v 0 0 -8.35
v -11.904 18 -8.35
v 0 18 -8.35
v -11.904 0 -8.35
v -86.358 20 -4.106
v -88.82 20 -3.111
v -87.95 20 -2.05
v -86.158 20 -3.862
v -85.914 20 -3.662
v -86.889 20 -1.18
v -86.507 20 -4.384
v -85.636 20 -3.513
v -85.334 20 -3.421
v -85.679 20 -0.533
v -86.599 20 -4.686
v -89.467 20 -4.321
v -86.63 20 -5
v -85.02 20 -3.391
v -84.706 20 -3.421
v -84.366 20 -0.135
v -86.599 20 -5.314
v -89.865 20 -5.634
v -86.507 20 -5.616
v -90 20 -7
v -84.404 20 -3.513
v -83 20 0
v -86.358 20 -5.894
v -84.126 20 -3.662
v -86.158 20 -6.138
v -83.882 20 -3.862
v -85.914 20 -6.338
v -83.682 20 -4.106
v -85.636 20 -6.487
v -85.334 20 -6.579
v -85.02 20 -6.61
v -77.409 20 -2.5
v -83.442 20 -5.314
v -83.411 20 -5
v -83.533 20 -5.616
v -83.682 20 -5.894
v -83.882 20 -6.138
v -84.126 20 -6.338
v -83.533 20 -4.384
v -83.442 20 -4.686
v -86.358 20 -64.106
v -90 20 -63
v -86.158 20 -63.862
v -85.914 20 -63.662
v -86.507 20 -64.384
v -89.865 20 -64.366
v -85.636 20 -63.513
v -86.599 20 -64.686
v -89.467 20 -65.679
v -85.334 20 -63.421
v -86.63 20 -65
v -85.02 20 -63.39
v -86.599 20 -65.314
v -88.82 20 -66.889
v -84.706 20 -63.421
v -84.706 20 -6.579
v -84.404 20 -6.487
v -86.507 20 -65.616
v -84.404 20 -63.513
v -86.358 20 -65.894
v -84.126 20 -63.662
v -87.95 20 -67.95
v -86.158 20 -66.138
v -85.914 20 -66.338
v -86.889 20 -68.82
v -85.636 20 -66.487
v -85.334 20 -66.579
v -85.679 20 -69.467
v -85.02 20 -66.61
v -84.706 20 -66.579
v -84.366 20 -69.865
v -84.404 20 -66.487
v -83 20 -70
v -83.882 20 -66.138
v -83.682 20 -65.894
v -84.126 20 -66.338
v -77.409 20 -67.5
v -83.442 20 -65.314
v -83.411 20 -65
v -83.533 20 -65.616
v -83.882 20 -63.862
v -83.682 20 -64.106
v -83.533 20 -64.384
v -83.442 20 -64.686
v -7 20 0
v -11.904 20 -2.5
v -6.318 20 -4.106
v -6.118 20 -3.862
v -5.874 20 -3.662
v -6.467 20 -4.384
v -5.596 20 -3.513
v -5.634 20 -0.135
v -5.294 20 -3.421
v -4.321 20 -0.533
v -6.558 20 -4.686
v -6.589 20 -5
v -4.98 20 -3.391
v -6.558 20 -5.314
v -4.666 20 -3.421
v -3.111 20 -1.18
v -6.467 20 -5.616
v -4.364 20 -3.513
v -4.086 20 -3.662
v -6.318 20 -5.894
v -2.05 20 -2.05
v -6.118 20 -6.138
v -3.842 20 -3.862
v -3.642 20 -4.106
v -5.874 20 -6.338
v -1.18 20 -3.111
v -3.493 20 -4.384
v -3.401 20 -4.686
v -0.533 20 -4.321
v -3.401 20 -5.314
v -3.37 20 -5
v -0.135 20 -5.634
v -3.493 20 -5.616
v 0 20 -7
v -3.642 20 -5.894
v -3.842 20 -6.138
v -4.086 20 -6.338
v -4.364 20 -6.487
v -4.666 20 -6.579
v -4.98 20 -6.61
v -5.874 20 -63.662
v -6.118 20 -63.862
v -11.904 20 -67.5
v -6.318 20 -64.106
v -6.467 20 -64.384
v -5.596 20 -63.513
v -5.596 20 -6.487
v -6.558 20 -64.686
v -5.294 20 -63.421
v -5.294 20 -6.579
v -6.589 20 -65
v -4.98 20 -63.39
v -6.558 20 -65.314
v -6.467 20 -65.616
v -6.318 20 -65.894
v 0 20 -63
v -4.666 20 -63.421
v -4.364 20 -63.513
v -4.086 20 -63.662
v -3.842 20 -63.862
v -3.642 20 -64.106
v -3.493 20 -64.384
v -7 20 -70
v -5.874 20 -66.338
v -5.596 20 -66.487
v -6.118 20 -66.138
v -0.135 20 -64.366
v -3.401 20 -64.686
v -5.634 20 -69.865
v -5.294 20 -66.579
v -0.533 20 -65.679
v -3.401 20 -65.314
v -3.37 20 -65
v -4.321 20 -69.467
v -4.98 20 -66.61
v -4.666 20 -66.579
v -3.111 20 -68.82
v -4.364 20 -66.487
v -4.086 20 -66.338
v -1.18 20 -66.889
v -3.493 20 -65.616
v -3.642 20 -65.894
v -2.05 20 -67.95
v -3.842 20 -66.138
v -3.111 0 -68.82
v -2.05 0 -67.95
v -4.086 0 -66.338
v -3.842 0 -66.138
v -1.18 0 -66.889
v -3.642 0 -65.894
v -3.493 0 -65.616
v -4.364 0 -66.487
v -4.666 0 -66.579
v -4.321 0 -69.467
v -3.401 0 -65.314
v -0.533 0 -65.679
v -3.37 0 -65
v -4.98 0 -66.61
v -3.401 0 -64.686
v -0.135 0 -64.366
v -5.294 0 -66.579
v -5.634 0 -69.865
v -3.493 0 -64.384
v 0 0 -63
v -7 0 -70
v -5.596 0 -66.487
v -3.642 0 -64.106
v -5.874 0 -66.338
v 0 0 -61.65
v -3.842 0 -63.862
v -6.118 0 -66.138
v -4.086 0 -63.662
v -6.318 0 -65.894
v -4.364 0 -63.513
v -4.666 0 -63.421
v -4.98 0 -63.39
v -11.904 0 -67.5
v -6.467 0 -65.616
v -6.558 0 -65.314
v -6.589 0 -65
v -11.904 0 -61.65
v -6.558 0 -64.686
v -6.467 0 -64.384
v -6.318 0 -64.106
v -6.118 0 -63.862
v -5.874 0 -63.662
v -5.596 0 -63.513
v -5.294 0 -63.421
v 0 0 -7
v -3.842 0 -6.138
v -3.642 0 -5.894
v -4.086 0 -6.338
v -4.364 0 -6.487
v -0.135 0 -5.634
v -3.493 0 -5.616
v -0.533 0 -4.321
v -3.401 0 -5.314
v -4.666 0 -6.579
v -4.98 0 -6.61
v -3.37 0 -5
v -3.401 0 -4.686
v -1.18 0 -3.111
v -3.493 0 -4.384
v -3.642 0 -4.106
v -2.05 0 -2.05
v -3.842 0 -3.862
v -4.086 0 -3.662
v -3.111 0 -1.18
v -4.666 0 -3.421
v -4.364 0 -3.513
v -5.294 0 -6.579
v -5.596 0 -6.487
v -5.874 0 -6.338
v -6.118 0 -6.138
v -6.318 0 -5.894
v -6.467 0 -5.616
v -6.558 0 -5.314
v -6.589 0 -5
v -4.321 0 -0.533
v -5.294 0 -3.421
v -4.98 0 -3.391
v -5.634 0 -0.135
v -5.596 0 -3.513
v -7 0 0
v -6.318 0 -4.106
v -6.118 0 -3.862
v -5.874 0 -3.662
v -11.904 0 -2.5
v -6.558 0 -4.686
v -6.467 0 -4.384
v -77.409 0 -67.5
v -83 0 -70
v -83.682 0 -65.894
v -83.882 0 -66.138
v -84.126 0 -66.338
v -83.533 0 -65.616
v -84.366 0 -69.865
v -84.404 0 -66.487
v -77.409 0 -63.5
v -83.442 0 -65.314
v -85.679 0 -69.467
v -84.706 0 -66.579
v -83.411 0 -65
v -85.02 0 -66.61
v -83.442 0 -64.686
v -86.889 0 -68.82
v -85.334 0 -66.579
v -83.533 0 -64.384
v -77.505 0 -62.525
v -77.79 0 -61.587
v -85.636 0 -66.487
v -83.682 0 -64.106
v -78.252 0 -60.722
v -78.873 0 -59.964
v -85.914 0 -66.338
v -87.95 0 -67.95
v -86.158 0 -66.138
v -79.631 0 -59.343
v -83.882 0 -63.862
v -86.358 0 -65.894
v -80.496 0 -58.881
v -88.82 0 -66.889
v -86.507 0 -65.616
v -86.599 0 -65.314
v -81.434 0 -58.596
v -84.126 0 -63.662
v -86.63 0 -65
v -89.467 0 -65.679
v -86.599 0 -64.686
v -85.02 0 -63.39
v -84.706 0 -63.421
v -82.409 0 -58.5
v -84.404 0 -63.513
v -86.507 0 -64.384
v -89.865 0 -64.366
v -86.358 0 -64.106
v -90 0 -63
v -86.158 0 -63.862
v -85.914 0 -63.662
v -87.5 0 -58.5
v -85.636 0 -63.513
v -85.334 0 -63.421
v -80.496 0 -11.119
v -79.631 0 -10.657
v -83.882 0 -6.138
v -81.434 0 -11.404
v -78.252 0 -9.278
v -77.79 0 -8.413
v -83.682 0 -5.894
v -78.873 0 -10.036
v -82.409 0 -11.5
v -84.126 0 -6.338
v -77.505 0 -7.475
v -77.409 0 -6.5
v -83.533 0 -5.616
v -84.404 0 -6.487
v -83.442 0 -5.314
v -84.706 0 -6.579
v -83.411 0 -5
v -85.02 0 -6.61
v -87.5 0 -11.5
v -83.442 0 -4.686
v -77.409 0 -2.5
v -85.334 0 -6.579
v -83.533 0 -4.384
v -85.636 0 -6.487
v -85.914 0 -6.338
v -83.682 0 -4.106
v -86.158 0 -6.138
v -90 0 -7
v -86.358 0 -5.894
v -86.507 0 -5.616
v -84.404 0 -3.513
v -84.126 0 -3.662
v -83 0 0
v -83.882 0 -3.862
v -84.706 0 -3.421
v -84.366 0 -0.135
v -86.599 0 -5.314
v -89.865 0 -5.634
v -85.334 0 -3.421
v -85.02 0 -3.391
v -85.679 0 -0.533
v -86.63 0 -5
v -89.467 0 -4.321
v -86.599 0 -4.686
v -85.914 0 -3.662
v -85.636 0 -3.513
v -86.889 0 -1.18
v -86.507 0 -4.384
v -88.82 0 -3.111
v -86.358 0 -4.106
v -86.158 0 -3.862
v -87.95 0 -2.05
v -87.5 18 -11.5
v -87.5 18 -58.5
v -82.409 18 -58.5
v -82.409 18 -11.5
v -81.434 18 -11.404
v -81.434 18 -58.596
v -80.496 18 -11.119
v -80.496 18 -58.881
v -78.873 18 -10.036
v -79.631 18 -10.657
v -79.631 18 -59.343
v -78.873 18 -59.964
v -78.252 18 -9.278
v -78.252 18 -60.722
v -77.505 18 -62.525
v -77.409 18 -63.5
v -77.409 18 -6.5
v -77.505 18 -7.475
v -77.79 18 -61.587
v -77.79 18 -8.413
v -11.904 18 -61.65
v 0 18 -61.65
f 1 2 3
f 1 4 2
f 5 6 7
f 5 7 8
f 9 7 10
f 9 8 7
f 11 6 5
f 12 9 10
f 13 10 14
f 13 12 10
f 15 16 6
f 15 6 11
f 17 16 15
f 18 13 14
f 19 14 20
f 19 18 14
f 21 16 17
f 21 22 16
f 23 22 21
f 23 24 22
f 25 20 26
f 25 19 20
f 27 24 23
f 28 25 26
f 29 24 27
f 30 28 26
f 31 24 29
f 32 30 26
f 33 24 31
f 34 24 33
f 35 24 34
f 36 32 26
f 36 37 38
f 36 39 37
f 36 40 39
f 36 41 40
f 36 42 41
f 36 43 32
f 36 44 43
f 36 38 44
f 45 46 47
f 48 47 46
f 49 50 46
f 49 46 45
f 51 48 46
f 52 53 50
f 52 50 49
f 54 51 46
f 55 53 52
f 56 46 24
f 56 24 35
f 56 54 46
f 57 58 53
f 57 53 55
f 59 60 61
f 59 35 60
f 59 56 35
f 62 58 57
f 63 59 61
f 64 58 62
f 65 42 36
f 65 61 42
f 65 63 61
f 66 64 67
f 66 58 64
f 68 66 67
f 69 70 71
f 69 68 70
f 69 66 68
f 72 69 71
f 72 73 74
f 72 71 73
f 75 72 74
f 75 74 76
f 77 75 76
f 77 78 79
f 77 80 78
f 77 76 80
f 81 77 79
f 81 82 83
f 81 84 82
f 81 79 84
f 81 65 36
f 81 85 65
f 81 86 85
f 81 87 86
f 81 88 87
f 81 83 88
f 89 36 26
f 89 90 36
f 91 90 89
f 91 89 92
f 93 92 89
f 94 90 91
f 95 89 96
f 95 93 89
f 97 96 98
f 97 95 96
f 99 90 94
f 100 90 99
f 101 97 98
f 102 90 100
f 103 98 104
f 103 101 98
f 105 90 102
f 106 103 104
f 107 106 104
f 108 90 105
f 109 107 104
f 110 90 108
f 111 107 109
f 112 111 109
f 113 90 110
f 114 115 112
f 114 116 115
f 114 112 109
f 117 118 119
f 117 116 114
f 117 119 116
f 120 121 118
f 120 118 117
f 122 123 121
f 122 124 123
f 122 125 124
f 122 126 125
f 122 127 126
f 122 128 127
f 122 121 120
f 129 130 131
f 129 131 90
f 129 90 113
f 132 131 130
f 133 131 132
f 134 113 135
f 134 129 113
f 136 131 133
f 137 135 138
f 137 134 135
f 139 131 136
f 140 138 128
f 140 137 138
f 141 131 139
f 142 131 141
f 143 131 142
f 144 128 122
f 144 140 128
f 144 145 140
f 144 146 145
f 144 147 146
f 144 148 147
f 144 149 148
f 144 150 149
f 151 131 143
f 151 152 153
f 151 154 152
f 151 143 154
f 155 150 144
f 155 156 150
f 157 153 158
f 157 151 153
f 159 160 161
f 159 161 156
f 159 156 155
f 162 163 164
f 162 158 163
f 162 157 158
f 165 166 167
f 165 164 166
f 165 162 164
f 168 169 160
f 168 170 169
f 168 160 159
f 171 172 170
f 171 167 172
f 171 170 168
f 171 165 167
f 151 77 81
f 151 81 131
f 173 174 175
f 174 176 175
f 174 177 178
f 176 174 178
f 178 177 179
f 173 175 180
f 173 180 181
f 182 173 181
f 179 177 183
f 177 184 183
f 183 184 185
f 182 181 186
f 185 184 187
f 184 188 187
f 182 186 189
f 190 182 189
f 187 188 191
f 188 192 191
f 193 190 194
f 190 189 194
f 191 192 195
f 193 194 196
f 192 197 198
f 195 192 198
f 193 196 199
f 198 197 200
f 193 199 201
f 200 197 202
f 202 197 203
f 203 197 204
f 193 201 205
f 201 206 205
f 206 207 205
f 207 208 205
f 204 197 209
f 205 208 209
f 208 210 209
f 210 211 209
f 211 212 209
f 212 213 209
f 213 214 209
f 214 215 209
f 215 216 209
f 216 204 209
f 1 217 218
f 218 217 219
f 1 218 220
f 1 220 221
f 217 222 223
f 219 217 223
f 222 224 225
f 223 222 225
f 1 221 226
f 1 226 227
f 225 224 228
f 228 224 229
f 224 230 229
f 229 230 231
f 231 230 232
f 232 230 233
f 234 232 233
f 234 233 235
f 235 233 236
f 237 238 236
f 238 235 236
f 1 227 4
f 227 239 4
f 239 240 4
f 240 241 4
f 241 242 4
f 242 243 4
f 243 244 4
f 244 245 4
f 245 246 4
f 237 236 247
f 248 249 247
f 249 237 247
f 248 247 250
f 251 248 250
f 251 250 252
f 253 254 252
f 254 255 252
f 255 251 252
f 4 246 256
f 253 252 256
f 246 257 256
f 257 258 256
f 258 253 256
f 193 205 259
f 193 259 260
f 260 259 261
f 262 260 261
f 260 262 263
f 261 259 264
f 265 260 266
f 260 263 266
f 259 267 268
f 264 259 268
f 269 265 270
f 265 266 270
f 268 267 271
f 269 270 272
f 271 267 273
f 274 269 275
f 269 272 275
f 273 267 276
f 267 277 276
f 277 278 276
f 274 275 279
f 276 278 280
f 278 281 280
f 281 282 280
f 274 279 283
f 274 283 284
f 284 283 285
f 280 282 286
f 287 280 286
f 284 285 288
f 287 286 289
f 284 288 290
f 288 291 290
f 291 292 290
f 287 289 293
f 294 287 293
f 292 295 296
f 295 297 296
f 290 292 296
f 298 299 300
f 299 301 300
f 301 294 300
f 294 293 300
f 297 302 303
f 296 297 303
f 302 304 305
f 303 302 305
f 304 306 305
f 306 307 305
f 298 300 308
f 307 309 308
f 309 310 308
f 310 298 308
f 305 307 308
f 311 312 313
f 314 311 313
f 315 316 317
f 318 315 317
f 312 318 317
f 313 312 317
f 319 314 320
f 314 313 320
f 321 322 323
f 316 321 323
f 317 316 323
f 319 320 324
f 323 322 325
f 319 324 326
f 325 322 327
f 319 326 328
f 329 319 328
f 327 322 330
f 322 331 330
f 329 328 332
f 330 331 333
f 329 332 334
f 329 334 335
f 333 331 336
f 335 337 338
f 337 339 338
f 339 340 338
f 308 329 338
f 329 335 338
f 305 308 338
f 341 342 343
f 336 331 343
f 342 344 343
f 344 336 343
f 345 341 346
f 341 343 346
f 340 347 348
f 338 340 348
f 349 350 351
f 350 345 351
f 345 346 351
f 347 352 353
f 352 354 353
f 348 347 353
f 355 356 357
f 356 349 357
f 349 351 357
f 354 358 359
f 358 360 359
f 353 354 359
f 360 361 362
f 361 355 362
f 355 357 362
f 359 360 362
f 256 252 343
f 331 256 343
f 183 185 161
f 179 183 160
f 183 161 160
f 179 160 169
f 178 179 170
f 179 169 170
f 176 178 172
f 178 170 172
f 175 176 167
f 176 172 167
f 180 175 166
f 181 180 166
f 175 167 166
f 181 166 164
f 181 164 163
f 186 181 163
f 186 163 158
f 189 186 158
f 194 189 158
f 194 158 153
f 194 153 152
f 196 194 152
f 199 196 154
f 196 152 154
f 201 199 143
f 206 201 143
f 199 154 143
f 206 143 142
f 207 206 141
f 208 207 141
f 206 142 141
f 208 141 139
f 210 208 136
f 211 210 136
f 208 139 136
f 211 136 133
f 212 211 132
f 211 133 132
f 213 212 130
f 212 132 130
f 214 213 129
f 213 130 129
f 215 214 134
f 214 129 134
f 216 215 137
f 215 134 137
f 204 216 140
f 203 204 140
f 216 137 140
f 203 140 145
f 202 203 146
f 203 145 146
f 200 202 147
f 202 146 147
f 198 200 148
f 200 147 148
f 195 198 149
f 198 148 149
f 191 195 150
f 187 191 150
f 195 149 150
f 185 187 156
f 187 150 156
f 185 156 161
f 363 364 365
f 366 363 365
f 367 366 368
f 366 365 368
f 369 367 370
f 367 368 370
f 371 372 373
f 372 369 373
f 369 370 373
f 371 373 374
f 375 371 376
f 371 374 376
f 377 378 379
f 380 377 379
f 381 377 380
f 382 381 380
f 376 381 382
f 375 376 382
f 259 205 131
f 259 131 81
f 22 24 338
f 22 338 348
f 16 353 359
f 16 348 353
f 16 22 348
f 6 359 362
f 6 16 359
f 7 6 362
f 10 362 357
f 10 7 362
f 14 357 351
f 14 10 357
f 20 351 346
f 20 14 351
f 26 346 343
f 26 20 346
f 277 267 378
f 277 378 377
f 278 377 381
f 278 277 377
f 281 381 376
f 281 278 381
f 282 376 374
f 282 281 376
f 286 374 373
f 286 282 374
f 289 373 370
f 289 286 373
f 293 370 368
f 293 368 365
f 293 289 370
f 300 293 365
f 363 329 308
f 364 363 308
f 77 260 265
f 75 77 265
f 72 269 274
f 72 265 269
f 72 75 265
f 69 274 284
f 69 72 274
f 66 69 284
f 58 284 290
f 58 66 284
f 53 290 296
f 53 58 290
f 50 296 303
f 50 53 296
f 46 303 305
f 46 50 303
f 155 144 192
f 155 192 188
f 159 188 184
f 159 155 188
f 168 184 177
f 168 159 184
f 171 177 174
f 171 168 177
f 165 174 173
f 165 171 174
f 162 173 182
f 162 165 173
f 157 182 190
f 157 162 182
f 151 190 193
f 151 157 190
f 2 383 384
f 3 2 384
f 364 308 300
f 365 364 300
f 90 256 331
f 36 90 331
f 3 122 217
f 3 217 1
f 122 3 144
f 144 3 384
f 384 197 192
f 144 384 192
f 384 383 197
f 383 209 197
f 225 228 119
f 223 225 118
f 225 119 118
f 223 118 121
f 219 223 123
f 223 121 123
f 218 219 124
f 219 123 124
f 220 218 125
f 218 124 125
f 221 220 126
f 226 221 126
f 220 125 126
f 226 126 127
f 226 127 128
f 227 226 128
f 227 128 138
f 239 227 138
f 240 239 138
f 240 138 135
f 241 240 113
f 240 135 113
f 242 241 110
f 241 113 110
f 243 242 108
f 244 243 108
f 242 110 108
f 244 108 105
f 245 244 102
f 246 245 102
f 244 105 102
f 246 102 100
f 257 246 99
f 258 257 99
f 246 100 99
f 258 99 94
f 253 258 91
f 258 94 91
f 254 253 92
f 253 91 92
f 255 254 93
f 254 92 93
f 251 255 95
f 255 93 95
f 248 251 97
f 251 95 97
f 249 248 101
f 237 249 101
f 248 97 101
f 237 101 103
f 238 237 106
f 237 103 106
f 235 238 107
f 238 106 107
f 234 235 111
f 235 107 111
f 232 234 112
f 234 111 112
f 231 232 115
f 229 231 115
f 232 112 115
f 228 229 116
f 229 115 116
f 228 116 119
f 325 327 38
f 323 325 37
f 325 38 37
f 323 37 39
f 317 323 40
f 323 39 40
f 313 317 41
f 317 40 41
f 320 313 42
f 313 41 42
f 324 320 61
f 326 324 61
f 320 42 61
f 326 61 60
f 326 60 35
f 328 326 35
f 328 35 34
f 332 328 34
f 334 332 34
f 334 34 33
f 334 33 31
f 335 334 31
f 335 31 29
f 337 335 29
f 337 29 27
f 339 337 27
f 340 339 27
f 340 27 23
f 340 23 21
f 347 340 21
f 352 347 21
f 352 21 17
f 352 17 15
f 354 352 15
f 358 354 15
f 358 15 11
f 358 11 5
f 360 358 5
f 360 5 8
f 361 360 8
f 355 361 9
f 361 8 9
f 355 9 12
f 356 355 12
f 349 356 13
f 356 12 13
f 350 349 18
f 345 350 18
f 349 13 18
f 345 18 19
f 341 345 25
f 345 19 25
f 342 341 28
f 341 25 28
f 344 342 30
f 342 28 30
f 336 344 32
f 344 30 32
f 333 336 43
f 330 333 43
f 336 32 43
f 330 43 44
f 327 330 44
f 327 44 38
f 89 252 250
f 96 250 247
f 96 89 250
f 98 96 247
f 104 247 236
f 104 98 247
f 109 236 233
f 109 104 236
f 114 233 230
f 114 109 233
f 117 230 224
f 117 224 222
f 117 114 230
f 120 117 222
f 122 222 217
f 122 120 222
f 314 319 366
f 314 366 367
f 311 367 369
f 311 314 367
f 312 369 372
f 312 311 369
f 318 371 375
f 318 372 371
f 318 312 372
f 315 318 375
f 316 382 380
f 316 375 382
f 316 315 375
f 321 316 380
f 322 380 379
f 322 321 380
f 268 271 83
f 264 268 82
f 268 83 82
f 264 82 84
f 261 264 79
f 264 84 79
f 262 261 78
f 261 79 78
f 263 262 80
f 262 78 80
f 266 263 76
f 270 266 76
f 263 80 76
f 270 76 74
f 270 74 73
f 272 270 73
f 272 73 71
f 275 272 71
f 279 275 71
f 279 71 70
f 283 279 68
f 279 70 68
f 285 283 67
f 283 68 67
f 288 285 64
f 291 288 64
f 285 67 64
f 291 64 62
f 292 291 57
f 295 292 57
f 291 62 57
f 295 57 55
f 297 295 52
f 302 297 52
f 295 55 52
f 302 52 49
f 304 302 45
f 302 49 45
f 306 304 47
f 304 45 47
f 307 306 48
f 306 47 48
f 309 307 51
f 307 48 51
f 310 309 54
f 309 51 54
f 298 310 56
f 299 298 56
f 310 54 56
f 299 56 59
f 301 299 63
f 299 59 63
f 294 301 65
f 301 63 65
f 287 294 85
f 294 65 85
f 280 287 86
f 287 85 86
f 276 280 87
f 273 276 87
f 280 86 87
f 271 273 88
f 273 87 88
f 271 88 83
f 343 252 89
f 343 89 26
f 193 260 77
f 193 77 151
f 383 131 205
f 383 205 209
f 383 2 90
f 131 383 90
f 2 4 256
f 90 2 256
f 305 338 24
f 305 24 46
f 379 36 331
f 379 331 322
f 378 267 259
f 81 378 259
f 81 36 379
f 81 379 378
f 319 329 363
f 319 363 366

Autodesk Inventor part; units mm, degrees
ref_plane "YZ Plane" through (0, 0, 0) normal (1, 0, 0) x (0, 1, 0)
ref_plane "XZ Plane" through (0, 0, 0) normal (0, 1, 0) x (-1, 0, 0)
ref_plane "XY Plane" through (0, 0, 0) normal (0, 0, 1) x (1, 0, 0)
sketch "Sketch1" plane through (0, 0, 0) normal (0, 1, 0) x (-1, 0, 0)
  line L0 (0, 0) -> (90, 0)
  line L1 (90, 0) -> (90, -70)
  line L2 (90, -70) -> (0, -70)
  circle A0 centre (85, -65) radius 1.6095
  circle A1 centre (85, -5) radius 1.6095
  circle A2 centre (5, -65) radius 1.6095
  circle A3 centre (5, -5) radius 1.6095
  line L3 (11.9037, -61.65) -> (11.9037, -67.5)
  line L4 (11.9037, -67.5) -> (77.409, -67.5)
  line L5 (77.409, -67.5) -> (77.409, -58.5)
  line L6 (87.5, -35) -> (87.5, -58.5)
  line L7 (87.5, -58.5) -> (77.409, -58.5)
  line L8 (11.9037, -61.65) -> (0, -61.65)
  line L9 (0, -61.65) -> (0, -70)
  line L10 (11.9037, -8.35) -> (11.9037, -2.5)
  line L11 (11.9037, -2.5) -> (77.409, -2.5)
  line L12 (77.409, -2.5) -> (77.409, -11.5)
  line L13 (87.5, -35) -> (87.5, -11.5)
  line L14 (87.5, -11.5) -> (77.409, -11.5)
  line L15 (11.9037, -8.35) -> (0, -8.35)
  line L16 (0, -8.35) -> (0, 0)
  line L17 (99.038, -35) -> (-9.0118, -35) construction
  point P0 (11.9037, -5.425)
  dimension "d34" = 70
  dimension "d35" = 60
  dimension "d37" = 10.091
  dimension "d38" = 65.5053
  dimension "d39" = 60
  dimension "d40" = 70
  dimension "d41" = 9
  dimension "d43" = 90
  dimension "d44" = 11.9037
  dimension "d45" = 3.219
  dimension "d46" = 47
  dimension "d47" = 5.85
  dimension "d48" = 8.35
  dimension "d49" = 5
  dimension "d50" = 5
  dimension "d51" = 5
  dimension "d52" = 5
extrude "Extrusion1" add sketch "Sketch1" along normal blind 20 contours L0 L1 L2 L9 L8 L3 L4 L5 L7 L6 L13 L14 L12 L11 L10 L15 L16 | A0 | A1 | A2 | A3
sketch "Sketch2" plane through (0, 20, 0) normal (0, 1, 0) x (1, 0, 0)
  line L0 (0, 70) -> (-90, 70) projected
  circle A0 centre (-4.9798, 65) radius 1.6095
  line L1 (-90, 70) -> (-90, 0) projected
  circle A1 centre (-85.0202, 65) radius 1.6095
  circle A2 centre (-4.9798, 5) radius 1.6095
  circle A3 centre (-85.0202, 5) radius 1.6095
  point P0 (0, 0)
extrude "Extrusion2" cut sketch "Sketch2" against normal blind 30
fillet "Fillet1" radius 7 4 edges at (-90, 10, 0) (-90, 10, -70) (0, 10, -70) (0, 10, 0)
sketch "Sketch4" plane through (0, 20, 0) normal (0, 1, 0) x (1, 0, 0)
  line L0 (-77.409, 11.5) -> (-77.409, 58.5)
  line L1 (-77.409, 58.5) -> (-87.5, 58.5)
  line L2 (-87.5, 58.5) -> (-87.5, 11.5)
  line L3 (-87.5, 11.5) -> (-77.409, 11.5)
  point P0 (0, 0)
extrude "Extrusion3" add sketch "Sketch4" against normal blind 2
sketch "Sketch5" plane through (0, 20, 0) normal (0, 1, 0) x (1, 0, 0)
  line L0 (-11.9037, 61.65) -> (-11.9037, 8.35)
  line L1 (-11.9037, 8.35) -> (0, 8.35)
  line L2 (0, 8.35) -> (0, 61.65)
  line L3 (0, 61.65) -> (-11.9037, 61.65)
  line L4 (-11.9037, 61.65) -> (-77.409, 61.65)
  line L5 (-77.409, 58.5) -> (-77.409, 67.5) projected
  line L6 (-77.409, 67.5) -> (-77.409, 61.65)
  line L7 (-11.9037, 61.65) -> (-11.9037, 67.5)
  line L8 (-11.9037, 67.5) -> (-77.409, 67.5)
  line L9 (-11.9037, 2.5) -> (-77.409, 2.5) projected
  line L10 (-11.9037, 8.35) -> (-11.9037, 2.5)
  line L11 (-11.9037, 2.5) -> (-77.409, 2.5)
  line L12 (-77.409, 2.5) -> (-77.409, 8.35)
  line L13 (-77.409, 8.35) -> (-11.9037, 8.35)
  point P0 (0, 0)
extrude "Extrusion4" add sketch "Sketch5" against normal blind 2
fillet "Fillet2" radius 5 1 edges at (-77.409, 9, -58.5)
fillet "Fillet3" radius 5 1 edges at (-77.409, 9, -11.5)
fillet "Fillet4" radius 5 4 edges at (-77.409, 19, -61.65) (-11.9037, 19, -61.65) (-11.9037, 19, -8.35) (-77.409, 19, -8.35)
sketch "Sketch6" plane through (0, 20, 0) normal (0, 1, 0) x (1, 0, 0)
  line L0 (-77.409, 67.5) -> (-11.9037, 67.5)
  line L1 (-11.9037, 67.5) -> (-11.9037, 2.5)
  line L2 (-11.9037, 2.5) -> (-77.409, 2.5)
  line L3 (-77.409, 2.5) -> (-77.409, 67.5)
  point P0 (0, 0)
extrude "Extrusion5" cut sketch "Sketch6" against normal blind 10
properties part number "Módulo de fixação Eletrônicos" material "PPS Plastic"
